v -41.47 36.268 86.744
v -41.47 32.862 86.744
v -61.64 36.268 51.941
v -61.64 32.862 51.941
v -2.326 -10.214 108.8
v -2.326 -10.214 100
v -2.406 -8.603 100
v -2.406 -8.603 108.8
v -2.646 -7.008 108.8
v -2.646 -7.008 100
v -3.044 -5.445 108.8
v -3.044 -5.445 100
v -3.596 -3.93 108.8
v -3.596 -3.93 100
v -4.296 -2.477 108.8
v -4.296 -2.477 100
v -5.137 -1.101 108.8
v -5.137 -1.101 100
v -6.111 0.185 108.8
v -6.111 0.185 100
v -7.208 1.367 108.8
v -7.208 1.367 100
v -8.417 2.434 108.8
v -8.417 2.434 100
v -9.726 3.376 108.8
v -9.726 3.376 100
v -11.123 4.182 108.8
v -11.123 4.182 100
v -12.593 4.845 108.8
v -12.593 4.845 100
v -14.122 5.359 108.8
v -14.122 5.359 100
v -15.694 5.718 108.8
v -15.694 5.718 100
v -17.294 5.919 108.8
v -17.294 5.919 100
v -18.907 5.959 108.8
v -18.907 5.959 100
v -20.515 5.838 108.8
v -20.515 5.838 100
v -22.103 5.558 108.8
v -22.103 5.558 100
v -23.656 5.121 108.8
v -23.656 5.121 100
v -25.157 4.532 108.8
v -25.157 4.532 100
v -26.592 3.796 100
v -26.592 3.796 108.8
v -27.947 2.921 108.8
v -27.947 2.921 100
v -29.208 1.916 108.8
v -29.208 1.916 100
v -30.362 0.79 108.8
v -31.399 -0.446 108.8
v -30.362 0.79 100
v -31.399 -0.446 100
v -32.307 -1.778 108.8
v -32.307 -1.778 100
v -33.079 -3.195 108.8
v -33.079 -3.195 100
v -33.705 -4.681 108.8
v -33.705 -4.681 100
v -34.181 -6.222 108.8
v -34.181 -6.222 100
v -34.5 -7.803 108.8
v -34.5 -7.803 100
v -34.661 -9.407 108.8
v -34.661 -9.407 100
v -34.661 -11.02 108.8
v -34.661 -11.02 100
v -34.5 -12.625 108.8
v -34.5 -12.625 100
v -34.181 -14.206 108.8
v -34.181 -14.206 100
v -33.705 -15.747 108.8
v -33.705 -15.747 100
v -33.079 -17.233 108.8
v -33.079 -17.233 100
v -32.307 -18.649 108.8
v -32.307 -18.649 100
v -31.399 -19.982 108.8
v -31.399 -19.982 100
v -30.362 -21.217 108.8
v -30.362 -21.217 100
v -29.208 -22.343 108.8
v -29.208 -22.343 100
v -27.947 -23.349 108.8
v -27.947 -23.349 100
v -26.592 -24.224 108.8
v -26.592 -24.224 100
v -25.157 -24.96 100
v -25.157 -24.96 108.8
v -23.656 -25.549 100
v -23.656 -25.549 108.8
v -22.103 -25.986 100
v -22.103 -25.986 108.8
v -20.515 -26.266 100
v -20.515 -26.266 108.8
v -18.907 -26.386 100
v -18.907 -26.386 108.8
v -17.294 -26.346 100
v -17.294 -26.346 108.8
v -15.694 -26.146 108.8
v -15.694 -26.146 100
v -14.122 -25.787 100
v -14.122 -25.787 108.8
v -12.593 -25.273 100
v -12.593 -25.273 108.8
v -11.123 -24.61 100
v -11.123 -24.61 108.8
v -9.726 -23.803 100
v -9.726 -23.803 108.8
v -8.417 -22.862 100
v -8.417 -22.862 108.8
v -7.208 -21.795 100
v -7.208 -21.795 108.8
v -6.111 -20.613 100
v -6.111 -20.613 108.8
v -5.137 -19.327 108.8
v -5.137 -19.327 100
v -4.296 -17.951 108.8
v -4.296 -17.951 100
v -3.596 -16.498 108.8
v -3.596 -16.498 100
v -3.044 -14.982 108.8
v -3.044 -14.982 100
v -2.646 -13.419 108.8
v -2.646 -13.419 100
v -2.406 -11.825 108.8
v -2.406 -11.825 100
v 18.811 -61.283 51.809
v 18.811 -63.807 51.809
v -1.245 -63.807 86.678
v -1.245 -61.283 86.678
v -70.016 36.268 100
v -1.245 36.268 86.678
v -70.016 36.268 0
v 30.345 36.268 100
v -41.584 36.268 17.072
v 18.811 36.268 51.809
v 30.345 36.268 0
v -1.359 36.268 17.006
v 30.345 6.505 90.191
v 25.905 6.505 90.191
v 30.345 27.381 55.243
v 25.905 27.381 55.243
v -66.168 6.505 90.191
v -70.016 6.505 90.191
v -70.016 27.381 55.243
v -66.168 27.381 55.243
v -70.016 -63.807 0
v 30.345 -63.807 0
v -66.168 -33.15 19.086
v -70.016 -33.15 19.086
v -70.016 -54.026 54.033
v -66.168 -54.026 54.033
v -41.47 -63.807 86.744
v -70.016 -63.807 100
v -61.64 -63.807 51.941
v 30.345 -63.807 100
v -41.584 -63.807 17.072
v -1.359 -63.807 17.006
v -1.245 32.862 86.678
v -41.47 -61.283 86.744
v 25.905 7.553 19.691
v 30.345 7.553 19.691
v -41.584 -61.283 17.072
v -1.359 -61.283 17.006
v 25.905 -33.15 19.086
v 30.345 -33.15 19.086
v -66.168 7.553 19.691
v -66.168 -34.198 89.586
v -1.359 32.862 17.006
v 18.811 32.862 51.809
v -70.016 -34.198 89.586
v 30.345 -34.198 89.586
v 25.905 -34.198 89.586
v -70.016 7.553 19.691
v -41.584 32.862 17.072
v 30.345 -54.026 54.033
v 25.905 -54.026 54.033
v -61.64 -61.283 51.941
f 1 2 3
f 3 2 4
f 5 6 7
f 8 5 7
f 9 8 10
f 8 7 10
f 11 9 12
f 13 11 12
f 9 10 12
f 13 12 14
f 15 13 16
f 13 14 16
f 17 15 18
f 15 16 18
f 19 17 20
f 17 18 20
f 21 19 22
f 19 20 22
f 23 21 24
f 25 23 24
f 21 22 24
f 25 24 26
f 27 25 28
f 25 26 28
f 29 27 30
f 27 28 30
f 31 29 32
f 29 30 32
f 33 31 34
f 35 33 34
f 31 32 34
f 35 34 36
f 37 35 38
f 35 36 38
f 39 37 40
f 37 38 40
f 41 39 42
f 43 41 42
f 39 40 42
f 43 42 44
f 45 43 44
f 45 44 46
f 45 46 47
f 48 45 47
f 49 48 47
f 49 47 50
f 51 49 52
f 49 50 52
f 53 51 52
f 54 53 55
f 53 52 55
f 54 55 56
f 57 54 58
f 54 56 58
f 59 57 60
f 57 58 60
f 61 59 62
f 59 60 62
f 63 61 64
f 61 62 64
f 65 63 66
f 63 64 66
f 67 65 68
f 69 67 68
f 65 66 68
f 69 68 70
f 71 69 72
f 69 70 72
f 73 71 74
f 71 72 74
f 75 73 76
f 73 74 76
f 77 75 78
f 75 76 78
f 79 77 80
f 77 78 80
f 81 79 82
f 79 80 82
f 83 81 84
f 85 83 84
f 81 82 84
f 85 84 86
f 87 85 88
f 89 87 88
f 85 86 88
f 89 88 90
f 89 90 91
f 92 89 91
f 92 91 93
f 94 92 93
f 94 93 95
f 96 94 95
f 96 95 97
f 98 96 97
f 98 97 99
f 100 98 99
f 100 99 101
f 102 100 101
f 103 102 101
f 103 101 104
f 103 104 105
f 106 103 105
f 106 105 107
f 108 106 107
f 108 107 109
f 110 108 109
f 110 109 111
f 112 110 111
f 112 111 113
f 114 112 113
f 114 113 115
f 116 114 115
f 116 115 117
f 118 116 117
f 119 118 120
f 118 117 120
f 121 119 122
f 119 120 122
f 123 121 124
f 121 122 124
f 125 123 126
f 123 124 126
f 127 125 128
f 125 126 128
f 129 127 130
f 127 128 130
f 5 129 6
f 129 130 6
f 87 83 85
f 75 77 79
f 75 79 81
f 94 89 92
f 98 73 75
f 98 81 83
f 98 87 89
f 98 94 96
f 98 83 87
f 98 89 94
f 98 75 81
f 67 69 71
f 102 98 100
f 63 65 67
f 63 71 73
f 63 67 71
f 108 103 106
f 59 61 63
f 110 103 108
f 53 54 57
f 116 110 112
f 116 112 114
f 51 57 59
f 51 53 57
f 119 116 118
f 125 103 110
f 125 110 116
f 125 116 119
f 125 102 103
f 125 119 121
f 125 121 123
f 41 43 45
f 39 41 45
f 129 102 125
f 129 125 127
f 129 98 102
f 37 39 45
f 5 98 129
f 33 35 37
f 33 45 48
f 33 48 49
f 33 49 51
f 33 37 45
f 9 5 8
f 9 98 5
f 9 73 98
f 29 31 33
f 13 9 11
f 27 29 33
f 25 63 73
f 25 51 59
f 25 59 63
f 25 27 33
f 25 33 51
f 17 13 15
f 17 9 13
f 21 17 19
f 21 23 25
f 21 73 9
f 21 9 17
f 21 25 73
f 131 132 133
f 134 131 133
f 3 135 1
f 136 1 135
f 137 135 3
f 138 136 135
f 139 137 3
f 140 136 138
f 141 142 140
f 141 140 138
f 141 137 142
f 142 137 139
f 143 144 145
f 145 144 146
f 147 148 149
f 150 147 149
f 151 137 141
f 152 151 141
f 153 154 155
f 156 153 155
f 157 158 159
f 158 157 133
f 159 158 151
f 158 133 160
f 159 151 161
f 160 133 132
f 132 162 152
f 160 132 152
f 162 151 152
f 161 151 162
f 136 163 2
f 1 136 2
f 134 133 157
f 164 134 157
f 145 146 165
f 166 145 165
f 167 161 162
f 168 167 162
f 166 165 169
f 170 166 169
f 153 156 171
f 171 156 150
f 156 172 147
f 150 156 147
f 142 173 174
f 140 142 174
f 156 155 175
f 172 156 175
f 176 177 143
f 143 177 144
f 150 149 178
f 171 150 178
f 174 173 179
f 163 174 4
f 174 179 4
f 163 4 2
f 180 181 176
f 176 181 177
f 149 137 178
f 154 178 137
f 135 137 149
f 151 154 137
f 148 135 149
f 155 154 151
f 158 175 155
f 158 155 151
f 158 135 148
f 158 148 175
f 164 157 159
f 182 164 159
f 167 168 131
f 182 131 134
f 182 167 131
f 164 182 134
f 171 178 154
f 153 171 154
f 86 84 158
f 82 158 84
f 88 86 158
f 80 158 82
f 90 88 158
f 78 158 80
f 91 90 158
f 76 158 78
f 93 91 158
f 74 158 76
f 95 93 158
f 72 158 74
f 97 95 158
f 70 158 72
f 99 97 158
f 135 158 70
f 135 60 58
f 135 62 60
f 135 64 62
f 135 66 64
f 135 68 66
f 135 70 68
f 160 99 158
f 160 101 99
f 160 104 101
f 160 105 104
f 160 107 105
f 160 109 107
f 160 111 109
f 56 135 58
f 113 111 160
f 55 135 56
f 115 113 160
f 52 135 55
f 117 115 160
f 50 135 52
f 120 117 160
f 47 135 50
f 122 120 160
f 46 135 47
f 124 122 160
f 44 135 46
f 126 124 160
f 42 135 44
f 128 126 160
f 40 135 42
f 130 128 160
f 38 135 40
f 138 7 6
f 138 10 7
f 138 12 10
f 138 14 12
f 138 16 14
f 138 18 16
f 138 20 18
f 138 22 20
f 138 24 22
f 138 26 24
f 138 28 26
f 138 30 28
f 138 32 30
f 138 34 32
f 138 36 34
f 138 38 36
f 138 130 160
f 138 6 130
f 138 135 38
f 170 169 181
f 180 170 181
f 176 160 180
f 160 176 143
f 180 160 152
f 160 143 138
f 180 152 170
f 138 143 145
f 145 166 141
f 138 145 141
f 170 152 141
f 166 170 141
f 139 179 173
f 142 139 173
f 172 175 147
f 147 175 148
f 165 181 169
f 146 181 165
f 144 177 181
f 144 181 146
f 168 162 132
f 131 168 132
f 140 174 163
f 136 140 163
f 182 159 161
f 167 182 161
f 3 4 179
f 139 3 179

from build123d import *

# Parameters (mm, degrees)
F0_W      = 100.361844
F0_H      = 100.074067
F1_DEPTH  = 100
F3_DEPTH  = 114
F4_W      = 94.14474
F4_H      = 94.934216
F5_DEPTH  = 95
F7_DEPTH  = 134
F8_W      = 92.072367
F8_H      = 92.960529
F9_DEPTH  = 94.6
F10_R     = 16.177591
F11_DEPTH = 8.8


with BuildPart() as f1:
    # F0 (on Top) → F1 (new body)
    with BuildSketch(Plane.XY):
        with Locations((-19.835529, -13.769492)):
            Rectangle(F0_W, F0_H)
    extrude(amount=F1_DEPTH)

    # F2 (on face) → F3 (cut)
    with BuildSketch(Plane.XZ.offset(63.806526)):
        Polygon((18.810559, 51.808965), (-1.24477, 86.677882), (-41.469803, 86.743916), (-61.639506, 51.941033), (-41.584177, 17.072116), (-1.359144, 17.006082), align=None)
    extrude(amount=-F3_DEPTH, mode=Mode.SUBTRACT)

    # F4 (on face) → F5 (join)
    with BuildSketch(Plane(origin=(-70.016451, 0, 0), x_dir=(0, -1, 0), z_dir=(-1, 0, 0))):
        with Locations((14.210526, 50.000002)):
            Rectangle(F4_W, F4_H)
    extrude(amount=-F5_DEPTH)

    # F6 (on face) → F7 (cut)
    with BuildSketch(Plane(origin=(-70.016451, 0, 0), x_dir=(0, -1, 0), z_dir=(-1, 0, 0))):
        Polygon((54.025555, 54.032898), (34.198133, 89.585522), (-6.505054, 90.190783), (-27.380819, 55.243419), (-7.553397, 19.690795), (33.149791, 19.085534), align=None)
    extrude(amount=-F7_DEPTH, mode=Mode.SUBTRACT)

    # F8 (on face) → F9 (join)
    with BuildSketch(Plane.XY.offset(100)):
        with Locations((-20.13158, -13.766448)):
            Rectangle(F8_W, F8_H)
    extrude(amount=-F9_DEPTH)

    # F10 (on face) → F11 (join)
    with BuildSketch(Plane.XY.offset(100)):
        with Locations((-18.50329, -10.213816)):
            Circle(F10_R)
    extrude(amount=F11_DEPTH)


solid = f1.part
